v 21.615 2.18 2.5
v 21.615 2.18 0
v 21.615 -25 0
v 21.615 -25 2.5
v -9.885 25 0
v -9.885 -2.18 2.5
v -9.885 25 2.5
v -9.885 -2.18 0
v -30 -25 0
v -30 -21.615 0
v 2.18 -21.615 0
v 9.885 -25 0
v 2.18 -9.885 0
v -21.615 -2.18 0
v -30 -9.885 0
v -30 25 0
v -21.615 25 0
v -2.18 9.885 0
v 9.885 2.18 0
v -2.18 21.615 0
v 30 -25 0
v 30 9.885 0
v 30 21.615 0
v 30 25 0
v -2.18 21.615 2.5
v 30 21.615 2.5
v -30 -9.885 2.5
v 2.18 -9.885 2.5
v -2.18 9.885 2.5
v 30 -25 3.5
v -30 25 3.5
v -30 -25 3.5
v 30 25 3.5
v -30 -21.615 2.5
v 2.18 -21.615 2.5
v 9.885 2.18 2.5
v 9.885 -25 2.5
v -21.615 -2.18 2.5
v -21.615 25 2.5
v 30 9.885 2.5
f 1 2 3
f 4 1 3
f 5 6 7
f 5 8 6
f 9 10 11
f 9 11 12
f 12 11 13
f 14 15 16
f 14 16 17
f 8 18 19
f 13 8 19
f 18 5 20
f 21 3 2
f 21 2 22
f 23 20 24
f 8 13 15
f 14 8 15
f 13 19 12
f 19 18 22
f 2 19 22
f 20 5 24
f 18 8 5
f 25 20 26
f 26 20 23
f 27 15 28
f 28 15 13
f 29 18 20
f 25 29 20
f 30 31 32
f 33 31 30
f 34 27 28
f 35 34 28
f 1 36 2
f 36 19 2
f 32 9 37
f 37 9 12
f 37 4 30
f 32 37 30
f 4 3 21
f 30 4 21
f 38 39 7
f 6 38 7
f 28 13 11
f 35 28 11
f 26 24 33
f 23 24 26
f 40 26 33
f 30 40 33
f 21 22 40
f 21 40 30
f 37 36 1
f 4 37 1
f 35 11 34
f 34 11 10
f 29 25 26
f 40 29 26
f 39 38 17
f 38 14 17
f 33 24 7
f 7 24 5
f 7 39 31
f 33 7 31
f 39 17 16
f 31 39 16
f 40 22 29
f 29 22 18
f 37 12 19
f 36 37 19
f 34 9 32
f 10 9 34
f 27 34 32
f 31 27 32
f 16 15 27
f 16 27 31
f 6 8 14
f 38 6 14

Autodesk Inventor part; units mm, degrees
ref_plane "YZ Plane" through (0, 0, 0) normal (1, 0, 0) x (0, 1, 0)
ref_plane "XZ Plane" through (0, 0, 0) normal (0, 1, 0) x (-1, 0, 0)
ref_plane "XY Plane" through (0, 0, 0) normal (0, 0, 1) x (1, 0, 0)
sketch "Sketch1" plane through (0, 0, 0) normal (0, 0, 1) x (1, 0, 0)
  line L0 (30, 25) -> (-30, 25) projected
  line L1 (-30, -25) -> (-30, 25) projected
  line L2 (-30, -25) -> (30, -25) projected
  line L3 (30, 25) -> (30, -25) projected
  line L4 (21.9198, 18.925) -> (23.3698, 18.925) projected
  line L5 (23.3698, 18.925) -> (23.3698, 12.575) projected
  line L6 (23.3698, 12.575) -> (21.9198, 12.575) projected
  line L7 (21.9198, 12.575) -> (21.9198, 9.885) projected
  line L8 (21.9198, 9.885) -> (-2.18, 9.885) projected
  line L9 (-2.18, 9.885) -> (-2.18, 21.615) projected
  line L10 (-2.18, 21.615) -> (21.9198, 21.615) projected
  line L11 (21.9198, 21.615) -> (21.9198, 18.925) projected
  line L12 (-12.575, 23.3698) -> (-12.575, 21.9198) projected
  line L13 (-12.575, 21.9198) -> (-9.885, 21.9198) projected
  line L14 (-9.885, 21.9198) -> (-9.885, -2.18) projected
  line L15 (-9.885, -2.18) -> (-21.615, -2.18) projected
  line L16 (-21.615, -2.18) -> (-21.615, 21.9198) projected
  line L17 (-21.615, 21.9198) -> (-18.925, 21.9198) projected
  line L18 (-18.925, 21.9198) -> (-18.925, 23.3698) projected
  line L19 (-18.925, 23.3698) -> (-12.575, 23.3698) projected
  line L20 (-23.3698, -12.575) -> (-21.9198, -12.575) projected
  line L21 (-21.9198, -12.575) -> (-21.9198, -9.885) projected
  line L22 (-21.9198, -9.885) -> (2.18, -9.885) projected
  line L23 (2.18, -9.885) -> (2.18, -21.615) projected
  line L24 (2.18, -21.615) -> (-21.9198, -21.615) projected
  line L25 (-21.9198, -21.615) -> (-21.9198, -18.925) projected
  line L26 (-21.9198, -18.925) -> (-23.3698, -18.925) projected
  line L27 (-23.3698, -18.925) -> (-23.3698, -12.575) projected
  line L28 (12.575, -23.3698) -> (12.575, -21.9198) projected
  line L29 (12.575, -21.9198) -> (9.885, -21.9198) projected
  line L30 (9.885, -21.9198) -> (9.885, 2.18) projected
  line L31 (9.885, 2.18) -> (21.615, 2.18) projected
  line L32 (21.615, 2.18) -> (21.615, -21.9198) projected
  line L33 (21.615, -21.9198) -> (18.925, -21.9198) projected
  line L34 (18.925, -21.9198) -> (18.925, -23.3698) projected
  line L35 (18.925, -23.3698) -> (12.575, -23.3698) projected
  line L36 (9.885, -21.9198) -> (9.885, -25)
  line L37 (21.615, -21.9198) -> (21.615, -25)
  line L38 (-21.9198, -21.615) -> (-30, -21.615)
  line L39 (-21.9198, -9.885) -> (-30, -9.885)
  line L40 (-21.615, 21.9198) -> (-21.615, 25)
  line L41 (-9.885, 21.9198) -> (-9.885, 25)
  line L42 (21.9198, 9.885) -> (30, 9.885)
  line L43 (21.9198, 21.615) -> (30, 21.615)
  point P0 (0, 0)
extrude "Extrusion1" add sketch "Sketch1" along normal blind 2.5 contours L3 L43 L10 L9 L8 L42 L2 L37 L32 L31 L30 L36 L1 L38 L24 L23 L22 L39 L0 L40 L16 L15 L14 L41
sketch "Sketch2" plane through (0, 0, 2.5) normal (0, 0, 1) x (1, 0, 0)
  line L0 (-21.615, 25) -> (-30, 25) projected
  line L1 (30, -25) -> (30, 9.885) projected
  line L2 (-30, 25) -> (30, 25)
  line L3 (30, 25) -> (30, -25)
  line L4 (30, -25) -> (-30, -25)
  line L5 (-30, -25) -> (-30, 25)
  point P0 (0, 0)
extrude "Extrusion2" add sketch "Sketch2" along normal blind 1
properties part number "CableHolder"
